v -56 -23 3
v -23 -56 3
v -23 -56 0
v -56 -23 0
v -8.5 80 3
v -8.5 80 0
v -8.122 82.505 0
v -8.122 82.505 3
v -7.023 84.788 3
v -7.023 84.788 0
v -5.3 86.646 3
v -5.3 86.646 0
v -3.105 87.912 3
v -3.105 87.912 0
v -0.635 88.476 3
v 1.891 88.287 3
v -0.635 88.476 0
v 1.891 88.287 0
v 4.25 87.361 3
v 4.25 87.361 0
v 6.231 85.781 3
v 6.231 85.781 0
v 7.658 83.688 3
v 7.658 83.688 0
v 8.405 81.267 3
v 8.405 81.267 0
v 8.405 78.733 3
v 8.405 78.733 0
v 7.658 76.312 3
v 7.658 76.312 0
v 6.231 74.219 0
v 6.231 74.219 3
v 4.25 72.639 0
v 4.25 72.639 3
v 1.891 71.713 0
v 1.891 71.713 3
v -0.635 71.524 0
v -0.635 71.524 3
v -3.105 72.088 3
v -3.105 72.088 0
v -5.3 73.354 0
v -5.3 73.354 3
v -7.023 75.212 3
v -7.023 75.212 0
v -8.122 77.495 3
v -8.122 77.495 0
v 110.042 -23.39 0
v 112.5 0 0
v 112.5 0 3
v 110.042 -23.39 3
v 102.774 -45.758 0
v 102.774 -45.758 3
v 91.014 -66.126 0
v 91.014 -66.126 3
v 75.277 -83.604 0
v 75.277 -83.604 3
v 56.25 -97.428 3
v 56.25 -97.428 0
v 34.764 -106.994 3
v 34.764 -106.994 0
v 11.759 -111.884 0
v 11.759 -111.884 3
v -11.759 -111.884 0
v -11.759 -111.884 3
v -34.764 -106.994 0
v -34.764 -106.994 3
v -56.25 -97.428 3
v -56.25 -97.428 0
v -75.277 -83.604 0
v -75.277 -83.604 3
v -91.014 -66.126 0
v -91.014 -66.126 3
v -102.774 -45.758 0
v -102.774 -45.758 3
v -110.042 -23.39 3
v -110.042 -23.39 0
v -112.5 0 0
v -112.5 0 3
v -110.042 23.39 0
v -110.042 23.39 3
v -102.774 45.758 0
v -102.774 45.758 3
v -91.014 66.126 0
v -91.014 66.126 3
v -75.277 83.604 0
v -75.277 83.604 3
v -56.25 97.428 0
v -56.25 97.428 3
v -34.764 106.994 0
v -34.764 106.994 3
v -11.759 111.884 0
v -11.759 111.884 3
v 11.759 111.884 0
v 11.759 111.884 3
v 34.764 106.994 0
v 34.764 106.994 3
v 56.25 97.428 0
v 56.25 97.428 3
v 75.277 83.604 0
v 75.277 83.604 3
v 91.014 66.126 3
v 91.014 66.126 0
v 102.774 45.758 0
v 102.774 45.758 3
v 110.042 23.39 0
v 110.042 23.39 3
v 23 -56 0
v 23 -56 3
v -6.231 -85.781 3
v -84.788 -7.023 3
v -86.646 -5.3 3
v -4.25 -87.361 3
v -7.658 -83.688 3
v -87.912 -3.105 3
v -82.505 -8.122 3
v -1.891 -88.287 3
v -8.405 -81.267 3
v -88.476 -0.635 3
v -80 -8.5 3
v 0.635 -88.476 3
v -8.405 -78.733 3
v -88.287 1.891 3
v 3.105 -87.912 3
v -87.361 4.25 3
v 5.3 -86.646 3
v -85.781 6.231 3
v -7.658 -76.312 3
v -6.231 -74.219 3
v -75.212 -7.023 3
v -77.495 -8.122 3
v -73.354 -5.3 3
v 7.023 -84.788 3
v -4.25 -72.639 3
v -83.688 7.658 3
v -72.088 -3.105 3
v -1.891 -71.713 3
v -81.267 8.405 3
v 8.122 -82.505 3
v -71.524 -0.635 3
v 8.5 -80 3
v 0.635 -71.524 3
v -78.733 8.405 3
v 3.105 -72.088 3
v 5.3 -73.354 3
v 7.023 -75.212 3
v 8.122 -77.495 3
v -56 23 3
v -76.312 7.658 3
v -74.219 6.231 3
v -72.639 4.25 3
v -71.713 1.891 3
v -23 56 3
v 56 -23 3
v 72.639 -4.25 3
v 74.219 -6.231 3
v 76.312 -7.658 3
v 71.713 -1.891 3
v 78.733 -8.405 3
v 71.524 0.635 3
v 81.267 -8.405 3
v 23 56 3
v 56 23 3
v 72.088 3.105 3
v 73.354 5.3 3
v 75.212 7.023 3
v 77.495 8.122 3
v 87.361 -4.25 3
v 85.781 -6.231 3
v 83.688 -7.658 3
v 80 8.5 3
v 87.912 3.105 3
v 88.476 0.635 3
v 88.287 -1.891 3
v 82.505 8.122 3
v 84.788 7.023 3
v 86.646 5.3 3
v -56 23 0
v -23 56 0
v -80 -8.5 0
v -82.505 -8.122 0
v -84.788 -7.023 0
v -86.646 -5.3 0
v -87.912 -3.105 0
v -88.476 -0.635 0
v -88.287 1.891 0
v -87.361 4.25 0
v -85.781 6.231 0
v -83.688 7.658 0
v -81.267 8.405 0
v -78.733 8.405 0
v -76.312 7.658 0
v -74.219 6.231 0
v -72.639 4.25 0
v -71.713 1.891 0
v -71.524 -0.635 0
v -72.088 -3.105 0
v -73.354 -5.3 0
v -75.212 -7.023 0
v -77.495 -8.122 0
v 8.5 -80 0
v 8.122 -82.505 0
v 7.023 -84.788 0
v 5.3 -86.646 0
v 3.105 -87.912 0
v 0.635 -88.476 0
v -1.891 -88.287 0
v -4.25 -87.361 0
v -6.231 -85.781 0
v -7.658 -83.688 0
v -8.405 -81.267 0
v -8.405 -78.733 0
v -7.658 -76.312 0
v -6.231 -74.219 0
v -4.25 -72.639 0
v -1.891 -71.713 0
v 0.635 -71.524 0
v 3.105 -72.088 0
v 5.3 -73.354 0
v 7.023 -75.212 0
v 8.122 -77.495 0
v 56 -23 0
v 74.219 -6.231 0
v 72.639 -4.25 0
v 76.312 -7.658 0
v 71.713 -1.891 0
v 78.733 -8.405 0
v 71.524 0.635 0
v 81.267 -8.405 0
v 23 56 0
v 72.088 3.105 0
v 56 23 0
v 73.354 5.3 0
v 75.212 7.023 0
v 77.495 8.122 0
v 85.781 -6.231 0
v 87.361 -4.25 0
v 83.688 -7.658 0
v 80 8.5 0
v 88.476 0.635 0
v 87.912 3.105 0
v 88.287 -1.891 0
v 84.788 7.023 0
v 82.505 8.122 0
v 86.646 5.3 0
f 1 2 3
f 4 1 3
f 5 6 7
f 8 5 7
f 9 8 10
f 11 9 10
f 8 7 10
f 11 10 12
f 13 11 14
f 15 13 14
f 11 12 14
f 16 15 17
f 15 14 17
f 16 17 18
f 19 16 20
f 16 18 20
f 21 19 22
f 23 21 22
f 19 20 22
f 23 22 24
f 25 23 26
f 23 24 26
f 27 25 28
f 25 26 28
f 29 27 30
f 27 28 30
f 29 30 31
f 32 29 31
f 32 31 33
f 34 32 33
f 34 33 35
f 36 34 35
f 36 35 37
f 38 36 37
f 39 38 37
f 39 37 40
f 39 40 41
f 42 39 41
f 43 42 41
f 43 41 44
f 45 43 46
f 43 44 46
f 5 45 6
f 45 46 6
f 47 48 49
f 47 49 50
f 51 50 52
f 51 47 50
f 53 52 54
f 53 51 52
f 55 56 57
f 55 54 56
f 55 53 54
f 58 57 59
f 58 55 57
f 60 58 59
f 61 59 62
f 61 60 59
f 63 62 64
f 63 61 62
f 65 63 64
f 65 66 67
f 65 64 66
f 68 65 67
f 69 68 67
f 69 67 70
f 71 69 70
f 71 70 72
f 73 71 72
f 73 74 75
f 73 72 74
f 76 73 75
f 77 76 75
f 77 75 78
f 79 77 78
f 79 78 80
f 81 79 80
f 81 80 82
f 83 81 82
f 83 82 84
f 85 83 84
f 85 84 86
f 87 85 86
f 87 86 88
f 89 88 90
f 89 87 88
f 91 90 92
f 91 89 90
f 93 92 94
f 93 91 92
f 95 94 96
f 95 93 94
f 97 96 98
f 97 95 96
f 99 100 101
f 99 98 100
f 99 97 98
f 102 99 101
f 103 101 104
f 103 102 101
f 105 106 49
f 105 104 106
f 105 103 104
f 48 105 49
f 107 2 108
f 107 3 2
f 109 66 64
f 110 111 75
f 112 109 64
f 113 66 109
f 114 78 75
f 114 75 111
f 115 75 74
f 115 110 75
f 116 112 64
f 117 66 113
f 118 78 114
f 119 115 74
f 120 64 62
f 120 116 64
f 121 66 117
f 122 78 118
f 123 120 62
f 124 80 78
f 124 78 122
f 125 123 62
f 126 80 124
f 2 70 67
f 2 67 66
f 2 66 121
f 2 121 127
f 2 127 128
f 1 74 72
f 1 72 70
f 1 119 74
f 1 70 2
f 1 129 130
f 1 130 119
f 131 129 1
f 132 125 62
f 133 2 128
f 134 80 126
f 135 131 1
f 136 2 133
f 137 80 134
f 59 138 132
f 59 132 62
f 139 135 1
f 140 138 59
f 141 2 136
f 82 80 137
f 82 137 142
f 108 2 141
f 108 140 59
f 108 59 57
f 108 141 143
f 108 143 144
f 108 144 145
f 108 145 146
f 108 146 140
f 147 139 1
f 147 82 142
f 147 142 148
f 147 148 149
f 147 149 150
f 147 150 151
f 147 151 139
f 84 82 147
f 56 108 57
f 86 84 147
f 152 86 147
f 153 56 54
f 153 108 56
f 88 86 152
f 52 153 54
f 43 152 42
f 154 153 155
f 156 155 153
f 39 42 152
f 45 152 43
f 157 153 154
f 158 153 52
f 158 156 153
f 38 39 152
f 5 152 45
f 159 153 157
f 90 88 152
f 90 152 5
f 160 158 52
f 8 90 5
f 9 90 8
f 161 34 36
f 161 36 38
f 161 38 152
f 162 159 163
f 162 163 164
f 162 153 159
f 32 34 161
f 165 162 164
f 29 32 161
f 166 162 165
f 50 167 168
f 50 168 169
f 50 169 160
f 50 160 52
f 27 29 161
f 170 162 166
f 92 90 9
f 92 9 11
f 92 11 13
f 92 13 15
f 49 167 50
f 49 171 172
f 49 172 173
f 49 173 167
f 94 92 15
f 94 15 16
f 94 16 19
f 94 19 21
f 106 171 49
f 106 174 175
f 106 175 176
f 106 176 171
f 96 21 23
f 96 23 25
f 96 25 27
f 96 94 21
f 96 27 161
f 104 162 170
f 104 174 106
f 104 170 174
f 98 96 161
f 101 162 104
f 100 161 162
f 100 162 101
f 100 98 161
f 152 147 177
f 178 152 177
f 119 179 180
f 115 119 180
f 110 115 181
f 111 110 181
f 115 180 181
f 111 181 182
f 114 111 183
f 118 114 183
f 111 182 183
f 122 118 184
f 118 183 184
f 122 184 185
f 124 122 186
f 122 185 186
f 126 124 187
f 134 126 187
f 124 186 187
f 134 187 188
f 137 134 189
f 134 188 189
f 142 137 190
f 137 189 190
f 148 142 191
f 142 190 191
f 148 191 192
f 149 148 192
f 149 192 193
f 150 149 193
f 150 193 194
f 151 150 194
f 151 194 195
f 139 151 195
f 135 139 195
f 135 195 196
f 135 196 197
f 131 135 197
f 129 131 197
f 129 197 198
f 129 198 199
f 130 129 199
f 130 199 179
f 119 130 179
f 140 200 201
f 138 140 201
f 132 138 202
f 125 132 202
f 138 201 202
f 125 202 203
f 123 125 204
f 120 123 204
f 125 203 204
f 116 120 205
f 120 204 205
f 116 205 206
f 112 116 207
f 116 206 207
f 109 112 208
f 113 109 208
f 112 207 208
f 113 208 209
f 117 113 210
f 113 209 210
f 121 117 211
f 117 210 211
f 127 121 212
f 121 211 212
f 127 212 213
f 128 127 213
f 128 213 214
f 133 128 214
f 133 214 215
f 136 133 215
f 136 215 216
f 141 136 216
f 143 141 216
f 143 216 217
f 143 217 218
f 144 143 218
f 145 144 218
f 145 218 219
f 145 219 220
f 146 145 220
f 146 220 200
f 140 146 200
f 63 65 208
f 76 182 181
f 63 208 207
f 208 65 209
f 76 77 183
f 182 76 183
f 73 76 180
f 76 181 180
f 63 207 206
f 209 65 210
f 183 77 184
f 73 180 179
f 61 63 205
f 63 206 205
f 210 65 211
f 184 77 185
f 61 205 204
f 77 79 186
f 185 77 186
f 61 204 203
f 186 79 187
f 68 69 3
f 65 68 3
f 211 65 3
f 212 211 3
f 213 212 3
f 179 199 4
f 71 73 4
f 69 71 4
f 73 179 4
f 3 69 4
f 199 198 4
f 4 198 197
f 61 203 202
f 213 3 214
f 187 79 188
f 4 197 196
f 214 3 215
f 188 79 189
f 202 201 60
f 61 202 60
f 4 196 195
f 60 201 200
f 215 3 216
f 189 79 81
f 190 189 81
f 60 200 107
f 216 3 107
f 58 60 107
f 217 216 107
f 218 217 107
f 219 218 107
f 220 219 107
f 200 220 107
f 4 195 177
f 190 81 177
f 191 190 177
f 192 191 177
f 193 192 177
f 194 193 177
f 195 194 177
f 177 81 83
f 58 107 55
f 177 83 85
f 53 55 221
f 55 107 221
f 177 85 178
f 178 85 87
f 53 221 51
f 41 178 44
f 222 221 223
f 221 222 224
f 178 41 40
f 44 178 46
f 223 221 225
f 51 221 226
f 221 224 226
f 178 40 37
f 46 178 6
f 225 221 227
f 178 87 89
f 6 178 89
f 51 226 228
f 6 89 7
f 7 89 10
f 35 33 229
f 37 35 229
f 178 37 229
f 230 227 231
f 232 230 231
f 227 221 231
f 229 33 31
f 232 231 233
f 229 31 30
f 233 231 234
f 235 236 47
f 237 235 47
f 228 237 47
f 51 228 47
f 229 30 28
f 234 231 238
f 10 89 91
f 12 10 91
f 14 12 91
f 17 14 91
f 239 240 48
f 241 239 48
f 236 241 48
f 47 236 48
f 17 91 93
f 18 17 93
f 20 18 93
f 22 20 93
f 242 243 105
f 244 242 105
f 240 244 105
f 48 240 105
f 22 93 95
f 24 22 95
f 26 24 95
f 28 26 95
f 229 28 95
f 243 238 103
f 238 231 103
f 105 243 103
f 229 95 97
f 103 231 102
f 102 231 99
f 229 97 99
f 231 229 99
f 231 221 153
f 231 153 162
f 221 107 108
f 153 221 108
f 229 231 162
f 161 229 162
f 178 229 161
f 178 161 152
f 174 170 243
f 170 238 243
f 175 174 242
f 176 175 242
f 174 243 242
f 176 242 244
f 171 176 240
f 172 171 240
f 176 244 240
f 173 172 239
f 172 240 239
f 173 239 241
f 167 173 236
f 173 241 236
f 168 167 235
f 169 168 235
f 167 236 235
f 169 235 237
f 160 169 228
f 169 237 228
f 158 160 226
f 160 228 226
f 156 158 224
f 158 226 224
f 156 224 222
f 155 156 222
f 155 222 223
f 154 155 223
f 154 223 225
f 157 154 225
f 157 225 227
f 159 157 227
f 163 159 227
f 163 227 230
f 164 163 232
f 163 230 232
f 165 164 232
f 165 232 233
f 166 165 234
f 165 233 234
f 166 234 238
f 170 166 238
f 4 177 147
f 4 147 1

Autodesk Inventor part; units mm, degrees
ref_plane "YZ Plane" through (0, 0, 0) normal (1, 0, 0) x (0, 1, 0)
ref_plane "XZ Plane" through (0, 0, 0) normal (0, 1, 0) x (-1, 0, 0)
ref_plane "XY Plane" through (0, 0, 0) normal (0, 0, 1) x (1, 0, 0)
sketch "Sketch1" plane through (0, 0, 0) normal (0, 0, 1) x (1, 0, 0)
  circle A0 centre (0, 0) radius 112.5
  line L0 (56, 56) -> (-56, 56)
  line L1 (-56, 56) -> (-56, -56)
  line L2 (-56, -56) -> (56, -56)
  line L3 (56, -56) -> (56, 56)
  line L4 (56, 56) -> (-56, -56) construction
  line L5 (-56, 56) -> (56, -56) construction
  dimension "d157" = 225
  dimension "d158" = 112
  dimension "d159" = 112
extrude "Plate5" add sketch "Sketch1" along normal blind 3
sketch "Sketch7" plane through (0, 0, 0) normal (0, 0, -1) x (-1, 0, 0)
  circle A0 centre (0, 80) radius 8.5
  point P0 (0, 0)
  dimension "d160" = 17
  dimension "d161" = 80
extrude "Cut1" cut sketch "Sketch7" against normal blind 3
pattern_circular "Circular Pattern1" count 4 over 360 about axis through (0, 0, -10) along (0, 0, 1) of "Cut1"
chamfer "Corner Chamfer2" distance 33 angle 45 4 edges at (-56, -56, 1.5) (56, -56, 1.5) (-56, 56, 1.5) (56, 56, 1.5)
properties part number "TZS 0972 funnel FLANGE 50-90" material "Stainless Steel"
